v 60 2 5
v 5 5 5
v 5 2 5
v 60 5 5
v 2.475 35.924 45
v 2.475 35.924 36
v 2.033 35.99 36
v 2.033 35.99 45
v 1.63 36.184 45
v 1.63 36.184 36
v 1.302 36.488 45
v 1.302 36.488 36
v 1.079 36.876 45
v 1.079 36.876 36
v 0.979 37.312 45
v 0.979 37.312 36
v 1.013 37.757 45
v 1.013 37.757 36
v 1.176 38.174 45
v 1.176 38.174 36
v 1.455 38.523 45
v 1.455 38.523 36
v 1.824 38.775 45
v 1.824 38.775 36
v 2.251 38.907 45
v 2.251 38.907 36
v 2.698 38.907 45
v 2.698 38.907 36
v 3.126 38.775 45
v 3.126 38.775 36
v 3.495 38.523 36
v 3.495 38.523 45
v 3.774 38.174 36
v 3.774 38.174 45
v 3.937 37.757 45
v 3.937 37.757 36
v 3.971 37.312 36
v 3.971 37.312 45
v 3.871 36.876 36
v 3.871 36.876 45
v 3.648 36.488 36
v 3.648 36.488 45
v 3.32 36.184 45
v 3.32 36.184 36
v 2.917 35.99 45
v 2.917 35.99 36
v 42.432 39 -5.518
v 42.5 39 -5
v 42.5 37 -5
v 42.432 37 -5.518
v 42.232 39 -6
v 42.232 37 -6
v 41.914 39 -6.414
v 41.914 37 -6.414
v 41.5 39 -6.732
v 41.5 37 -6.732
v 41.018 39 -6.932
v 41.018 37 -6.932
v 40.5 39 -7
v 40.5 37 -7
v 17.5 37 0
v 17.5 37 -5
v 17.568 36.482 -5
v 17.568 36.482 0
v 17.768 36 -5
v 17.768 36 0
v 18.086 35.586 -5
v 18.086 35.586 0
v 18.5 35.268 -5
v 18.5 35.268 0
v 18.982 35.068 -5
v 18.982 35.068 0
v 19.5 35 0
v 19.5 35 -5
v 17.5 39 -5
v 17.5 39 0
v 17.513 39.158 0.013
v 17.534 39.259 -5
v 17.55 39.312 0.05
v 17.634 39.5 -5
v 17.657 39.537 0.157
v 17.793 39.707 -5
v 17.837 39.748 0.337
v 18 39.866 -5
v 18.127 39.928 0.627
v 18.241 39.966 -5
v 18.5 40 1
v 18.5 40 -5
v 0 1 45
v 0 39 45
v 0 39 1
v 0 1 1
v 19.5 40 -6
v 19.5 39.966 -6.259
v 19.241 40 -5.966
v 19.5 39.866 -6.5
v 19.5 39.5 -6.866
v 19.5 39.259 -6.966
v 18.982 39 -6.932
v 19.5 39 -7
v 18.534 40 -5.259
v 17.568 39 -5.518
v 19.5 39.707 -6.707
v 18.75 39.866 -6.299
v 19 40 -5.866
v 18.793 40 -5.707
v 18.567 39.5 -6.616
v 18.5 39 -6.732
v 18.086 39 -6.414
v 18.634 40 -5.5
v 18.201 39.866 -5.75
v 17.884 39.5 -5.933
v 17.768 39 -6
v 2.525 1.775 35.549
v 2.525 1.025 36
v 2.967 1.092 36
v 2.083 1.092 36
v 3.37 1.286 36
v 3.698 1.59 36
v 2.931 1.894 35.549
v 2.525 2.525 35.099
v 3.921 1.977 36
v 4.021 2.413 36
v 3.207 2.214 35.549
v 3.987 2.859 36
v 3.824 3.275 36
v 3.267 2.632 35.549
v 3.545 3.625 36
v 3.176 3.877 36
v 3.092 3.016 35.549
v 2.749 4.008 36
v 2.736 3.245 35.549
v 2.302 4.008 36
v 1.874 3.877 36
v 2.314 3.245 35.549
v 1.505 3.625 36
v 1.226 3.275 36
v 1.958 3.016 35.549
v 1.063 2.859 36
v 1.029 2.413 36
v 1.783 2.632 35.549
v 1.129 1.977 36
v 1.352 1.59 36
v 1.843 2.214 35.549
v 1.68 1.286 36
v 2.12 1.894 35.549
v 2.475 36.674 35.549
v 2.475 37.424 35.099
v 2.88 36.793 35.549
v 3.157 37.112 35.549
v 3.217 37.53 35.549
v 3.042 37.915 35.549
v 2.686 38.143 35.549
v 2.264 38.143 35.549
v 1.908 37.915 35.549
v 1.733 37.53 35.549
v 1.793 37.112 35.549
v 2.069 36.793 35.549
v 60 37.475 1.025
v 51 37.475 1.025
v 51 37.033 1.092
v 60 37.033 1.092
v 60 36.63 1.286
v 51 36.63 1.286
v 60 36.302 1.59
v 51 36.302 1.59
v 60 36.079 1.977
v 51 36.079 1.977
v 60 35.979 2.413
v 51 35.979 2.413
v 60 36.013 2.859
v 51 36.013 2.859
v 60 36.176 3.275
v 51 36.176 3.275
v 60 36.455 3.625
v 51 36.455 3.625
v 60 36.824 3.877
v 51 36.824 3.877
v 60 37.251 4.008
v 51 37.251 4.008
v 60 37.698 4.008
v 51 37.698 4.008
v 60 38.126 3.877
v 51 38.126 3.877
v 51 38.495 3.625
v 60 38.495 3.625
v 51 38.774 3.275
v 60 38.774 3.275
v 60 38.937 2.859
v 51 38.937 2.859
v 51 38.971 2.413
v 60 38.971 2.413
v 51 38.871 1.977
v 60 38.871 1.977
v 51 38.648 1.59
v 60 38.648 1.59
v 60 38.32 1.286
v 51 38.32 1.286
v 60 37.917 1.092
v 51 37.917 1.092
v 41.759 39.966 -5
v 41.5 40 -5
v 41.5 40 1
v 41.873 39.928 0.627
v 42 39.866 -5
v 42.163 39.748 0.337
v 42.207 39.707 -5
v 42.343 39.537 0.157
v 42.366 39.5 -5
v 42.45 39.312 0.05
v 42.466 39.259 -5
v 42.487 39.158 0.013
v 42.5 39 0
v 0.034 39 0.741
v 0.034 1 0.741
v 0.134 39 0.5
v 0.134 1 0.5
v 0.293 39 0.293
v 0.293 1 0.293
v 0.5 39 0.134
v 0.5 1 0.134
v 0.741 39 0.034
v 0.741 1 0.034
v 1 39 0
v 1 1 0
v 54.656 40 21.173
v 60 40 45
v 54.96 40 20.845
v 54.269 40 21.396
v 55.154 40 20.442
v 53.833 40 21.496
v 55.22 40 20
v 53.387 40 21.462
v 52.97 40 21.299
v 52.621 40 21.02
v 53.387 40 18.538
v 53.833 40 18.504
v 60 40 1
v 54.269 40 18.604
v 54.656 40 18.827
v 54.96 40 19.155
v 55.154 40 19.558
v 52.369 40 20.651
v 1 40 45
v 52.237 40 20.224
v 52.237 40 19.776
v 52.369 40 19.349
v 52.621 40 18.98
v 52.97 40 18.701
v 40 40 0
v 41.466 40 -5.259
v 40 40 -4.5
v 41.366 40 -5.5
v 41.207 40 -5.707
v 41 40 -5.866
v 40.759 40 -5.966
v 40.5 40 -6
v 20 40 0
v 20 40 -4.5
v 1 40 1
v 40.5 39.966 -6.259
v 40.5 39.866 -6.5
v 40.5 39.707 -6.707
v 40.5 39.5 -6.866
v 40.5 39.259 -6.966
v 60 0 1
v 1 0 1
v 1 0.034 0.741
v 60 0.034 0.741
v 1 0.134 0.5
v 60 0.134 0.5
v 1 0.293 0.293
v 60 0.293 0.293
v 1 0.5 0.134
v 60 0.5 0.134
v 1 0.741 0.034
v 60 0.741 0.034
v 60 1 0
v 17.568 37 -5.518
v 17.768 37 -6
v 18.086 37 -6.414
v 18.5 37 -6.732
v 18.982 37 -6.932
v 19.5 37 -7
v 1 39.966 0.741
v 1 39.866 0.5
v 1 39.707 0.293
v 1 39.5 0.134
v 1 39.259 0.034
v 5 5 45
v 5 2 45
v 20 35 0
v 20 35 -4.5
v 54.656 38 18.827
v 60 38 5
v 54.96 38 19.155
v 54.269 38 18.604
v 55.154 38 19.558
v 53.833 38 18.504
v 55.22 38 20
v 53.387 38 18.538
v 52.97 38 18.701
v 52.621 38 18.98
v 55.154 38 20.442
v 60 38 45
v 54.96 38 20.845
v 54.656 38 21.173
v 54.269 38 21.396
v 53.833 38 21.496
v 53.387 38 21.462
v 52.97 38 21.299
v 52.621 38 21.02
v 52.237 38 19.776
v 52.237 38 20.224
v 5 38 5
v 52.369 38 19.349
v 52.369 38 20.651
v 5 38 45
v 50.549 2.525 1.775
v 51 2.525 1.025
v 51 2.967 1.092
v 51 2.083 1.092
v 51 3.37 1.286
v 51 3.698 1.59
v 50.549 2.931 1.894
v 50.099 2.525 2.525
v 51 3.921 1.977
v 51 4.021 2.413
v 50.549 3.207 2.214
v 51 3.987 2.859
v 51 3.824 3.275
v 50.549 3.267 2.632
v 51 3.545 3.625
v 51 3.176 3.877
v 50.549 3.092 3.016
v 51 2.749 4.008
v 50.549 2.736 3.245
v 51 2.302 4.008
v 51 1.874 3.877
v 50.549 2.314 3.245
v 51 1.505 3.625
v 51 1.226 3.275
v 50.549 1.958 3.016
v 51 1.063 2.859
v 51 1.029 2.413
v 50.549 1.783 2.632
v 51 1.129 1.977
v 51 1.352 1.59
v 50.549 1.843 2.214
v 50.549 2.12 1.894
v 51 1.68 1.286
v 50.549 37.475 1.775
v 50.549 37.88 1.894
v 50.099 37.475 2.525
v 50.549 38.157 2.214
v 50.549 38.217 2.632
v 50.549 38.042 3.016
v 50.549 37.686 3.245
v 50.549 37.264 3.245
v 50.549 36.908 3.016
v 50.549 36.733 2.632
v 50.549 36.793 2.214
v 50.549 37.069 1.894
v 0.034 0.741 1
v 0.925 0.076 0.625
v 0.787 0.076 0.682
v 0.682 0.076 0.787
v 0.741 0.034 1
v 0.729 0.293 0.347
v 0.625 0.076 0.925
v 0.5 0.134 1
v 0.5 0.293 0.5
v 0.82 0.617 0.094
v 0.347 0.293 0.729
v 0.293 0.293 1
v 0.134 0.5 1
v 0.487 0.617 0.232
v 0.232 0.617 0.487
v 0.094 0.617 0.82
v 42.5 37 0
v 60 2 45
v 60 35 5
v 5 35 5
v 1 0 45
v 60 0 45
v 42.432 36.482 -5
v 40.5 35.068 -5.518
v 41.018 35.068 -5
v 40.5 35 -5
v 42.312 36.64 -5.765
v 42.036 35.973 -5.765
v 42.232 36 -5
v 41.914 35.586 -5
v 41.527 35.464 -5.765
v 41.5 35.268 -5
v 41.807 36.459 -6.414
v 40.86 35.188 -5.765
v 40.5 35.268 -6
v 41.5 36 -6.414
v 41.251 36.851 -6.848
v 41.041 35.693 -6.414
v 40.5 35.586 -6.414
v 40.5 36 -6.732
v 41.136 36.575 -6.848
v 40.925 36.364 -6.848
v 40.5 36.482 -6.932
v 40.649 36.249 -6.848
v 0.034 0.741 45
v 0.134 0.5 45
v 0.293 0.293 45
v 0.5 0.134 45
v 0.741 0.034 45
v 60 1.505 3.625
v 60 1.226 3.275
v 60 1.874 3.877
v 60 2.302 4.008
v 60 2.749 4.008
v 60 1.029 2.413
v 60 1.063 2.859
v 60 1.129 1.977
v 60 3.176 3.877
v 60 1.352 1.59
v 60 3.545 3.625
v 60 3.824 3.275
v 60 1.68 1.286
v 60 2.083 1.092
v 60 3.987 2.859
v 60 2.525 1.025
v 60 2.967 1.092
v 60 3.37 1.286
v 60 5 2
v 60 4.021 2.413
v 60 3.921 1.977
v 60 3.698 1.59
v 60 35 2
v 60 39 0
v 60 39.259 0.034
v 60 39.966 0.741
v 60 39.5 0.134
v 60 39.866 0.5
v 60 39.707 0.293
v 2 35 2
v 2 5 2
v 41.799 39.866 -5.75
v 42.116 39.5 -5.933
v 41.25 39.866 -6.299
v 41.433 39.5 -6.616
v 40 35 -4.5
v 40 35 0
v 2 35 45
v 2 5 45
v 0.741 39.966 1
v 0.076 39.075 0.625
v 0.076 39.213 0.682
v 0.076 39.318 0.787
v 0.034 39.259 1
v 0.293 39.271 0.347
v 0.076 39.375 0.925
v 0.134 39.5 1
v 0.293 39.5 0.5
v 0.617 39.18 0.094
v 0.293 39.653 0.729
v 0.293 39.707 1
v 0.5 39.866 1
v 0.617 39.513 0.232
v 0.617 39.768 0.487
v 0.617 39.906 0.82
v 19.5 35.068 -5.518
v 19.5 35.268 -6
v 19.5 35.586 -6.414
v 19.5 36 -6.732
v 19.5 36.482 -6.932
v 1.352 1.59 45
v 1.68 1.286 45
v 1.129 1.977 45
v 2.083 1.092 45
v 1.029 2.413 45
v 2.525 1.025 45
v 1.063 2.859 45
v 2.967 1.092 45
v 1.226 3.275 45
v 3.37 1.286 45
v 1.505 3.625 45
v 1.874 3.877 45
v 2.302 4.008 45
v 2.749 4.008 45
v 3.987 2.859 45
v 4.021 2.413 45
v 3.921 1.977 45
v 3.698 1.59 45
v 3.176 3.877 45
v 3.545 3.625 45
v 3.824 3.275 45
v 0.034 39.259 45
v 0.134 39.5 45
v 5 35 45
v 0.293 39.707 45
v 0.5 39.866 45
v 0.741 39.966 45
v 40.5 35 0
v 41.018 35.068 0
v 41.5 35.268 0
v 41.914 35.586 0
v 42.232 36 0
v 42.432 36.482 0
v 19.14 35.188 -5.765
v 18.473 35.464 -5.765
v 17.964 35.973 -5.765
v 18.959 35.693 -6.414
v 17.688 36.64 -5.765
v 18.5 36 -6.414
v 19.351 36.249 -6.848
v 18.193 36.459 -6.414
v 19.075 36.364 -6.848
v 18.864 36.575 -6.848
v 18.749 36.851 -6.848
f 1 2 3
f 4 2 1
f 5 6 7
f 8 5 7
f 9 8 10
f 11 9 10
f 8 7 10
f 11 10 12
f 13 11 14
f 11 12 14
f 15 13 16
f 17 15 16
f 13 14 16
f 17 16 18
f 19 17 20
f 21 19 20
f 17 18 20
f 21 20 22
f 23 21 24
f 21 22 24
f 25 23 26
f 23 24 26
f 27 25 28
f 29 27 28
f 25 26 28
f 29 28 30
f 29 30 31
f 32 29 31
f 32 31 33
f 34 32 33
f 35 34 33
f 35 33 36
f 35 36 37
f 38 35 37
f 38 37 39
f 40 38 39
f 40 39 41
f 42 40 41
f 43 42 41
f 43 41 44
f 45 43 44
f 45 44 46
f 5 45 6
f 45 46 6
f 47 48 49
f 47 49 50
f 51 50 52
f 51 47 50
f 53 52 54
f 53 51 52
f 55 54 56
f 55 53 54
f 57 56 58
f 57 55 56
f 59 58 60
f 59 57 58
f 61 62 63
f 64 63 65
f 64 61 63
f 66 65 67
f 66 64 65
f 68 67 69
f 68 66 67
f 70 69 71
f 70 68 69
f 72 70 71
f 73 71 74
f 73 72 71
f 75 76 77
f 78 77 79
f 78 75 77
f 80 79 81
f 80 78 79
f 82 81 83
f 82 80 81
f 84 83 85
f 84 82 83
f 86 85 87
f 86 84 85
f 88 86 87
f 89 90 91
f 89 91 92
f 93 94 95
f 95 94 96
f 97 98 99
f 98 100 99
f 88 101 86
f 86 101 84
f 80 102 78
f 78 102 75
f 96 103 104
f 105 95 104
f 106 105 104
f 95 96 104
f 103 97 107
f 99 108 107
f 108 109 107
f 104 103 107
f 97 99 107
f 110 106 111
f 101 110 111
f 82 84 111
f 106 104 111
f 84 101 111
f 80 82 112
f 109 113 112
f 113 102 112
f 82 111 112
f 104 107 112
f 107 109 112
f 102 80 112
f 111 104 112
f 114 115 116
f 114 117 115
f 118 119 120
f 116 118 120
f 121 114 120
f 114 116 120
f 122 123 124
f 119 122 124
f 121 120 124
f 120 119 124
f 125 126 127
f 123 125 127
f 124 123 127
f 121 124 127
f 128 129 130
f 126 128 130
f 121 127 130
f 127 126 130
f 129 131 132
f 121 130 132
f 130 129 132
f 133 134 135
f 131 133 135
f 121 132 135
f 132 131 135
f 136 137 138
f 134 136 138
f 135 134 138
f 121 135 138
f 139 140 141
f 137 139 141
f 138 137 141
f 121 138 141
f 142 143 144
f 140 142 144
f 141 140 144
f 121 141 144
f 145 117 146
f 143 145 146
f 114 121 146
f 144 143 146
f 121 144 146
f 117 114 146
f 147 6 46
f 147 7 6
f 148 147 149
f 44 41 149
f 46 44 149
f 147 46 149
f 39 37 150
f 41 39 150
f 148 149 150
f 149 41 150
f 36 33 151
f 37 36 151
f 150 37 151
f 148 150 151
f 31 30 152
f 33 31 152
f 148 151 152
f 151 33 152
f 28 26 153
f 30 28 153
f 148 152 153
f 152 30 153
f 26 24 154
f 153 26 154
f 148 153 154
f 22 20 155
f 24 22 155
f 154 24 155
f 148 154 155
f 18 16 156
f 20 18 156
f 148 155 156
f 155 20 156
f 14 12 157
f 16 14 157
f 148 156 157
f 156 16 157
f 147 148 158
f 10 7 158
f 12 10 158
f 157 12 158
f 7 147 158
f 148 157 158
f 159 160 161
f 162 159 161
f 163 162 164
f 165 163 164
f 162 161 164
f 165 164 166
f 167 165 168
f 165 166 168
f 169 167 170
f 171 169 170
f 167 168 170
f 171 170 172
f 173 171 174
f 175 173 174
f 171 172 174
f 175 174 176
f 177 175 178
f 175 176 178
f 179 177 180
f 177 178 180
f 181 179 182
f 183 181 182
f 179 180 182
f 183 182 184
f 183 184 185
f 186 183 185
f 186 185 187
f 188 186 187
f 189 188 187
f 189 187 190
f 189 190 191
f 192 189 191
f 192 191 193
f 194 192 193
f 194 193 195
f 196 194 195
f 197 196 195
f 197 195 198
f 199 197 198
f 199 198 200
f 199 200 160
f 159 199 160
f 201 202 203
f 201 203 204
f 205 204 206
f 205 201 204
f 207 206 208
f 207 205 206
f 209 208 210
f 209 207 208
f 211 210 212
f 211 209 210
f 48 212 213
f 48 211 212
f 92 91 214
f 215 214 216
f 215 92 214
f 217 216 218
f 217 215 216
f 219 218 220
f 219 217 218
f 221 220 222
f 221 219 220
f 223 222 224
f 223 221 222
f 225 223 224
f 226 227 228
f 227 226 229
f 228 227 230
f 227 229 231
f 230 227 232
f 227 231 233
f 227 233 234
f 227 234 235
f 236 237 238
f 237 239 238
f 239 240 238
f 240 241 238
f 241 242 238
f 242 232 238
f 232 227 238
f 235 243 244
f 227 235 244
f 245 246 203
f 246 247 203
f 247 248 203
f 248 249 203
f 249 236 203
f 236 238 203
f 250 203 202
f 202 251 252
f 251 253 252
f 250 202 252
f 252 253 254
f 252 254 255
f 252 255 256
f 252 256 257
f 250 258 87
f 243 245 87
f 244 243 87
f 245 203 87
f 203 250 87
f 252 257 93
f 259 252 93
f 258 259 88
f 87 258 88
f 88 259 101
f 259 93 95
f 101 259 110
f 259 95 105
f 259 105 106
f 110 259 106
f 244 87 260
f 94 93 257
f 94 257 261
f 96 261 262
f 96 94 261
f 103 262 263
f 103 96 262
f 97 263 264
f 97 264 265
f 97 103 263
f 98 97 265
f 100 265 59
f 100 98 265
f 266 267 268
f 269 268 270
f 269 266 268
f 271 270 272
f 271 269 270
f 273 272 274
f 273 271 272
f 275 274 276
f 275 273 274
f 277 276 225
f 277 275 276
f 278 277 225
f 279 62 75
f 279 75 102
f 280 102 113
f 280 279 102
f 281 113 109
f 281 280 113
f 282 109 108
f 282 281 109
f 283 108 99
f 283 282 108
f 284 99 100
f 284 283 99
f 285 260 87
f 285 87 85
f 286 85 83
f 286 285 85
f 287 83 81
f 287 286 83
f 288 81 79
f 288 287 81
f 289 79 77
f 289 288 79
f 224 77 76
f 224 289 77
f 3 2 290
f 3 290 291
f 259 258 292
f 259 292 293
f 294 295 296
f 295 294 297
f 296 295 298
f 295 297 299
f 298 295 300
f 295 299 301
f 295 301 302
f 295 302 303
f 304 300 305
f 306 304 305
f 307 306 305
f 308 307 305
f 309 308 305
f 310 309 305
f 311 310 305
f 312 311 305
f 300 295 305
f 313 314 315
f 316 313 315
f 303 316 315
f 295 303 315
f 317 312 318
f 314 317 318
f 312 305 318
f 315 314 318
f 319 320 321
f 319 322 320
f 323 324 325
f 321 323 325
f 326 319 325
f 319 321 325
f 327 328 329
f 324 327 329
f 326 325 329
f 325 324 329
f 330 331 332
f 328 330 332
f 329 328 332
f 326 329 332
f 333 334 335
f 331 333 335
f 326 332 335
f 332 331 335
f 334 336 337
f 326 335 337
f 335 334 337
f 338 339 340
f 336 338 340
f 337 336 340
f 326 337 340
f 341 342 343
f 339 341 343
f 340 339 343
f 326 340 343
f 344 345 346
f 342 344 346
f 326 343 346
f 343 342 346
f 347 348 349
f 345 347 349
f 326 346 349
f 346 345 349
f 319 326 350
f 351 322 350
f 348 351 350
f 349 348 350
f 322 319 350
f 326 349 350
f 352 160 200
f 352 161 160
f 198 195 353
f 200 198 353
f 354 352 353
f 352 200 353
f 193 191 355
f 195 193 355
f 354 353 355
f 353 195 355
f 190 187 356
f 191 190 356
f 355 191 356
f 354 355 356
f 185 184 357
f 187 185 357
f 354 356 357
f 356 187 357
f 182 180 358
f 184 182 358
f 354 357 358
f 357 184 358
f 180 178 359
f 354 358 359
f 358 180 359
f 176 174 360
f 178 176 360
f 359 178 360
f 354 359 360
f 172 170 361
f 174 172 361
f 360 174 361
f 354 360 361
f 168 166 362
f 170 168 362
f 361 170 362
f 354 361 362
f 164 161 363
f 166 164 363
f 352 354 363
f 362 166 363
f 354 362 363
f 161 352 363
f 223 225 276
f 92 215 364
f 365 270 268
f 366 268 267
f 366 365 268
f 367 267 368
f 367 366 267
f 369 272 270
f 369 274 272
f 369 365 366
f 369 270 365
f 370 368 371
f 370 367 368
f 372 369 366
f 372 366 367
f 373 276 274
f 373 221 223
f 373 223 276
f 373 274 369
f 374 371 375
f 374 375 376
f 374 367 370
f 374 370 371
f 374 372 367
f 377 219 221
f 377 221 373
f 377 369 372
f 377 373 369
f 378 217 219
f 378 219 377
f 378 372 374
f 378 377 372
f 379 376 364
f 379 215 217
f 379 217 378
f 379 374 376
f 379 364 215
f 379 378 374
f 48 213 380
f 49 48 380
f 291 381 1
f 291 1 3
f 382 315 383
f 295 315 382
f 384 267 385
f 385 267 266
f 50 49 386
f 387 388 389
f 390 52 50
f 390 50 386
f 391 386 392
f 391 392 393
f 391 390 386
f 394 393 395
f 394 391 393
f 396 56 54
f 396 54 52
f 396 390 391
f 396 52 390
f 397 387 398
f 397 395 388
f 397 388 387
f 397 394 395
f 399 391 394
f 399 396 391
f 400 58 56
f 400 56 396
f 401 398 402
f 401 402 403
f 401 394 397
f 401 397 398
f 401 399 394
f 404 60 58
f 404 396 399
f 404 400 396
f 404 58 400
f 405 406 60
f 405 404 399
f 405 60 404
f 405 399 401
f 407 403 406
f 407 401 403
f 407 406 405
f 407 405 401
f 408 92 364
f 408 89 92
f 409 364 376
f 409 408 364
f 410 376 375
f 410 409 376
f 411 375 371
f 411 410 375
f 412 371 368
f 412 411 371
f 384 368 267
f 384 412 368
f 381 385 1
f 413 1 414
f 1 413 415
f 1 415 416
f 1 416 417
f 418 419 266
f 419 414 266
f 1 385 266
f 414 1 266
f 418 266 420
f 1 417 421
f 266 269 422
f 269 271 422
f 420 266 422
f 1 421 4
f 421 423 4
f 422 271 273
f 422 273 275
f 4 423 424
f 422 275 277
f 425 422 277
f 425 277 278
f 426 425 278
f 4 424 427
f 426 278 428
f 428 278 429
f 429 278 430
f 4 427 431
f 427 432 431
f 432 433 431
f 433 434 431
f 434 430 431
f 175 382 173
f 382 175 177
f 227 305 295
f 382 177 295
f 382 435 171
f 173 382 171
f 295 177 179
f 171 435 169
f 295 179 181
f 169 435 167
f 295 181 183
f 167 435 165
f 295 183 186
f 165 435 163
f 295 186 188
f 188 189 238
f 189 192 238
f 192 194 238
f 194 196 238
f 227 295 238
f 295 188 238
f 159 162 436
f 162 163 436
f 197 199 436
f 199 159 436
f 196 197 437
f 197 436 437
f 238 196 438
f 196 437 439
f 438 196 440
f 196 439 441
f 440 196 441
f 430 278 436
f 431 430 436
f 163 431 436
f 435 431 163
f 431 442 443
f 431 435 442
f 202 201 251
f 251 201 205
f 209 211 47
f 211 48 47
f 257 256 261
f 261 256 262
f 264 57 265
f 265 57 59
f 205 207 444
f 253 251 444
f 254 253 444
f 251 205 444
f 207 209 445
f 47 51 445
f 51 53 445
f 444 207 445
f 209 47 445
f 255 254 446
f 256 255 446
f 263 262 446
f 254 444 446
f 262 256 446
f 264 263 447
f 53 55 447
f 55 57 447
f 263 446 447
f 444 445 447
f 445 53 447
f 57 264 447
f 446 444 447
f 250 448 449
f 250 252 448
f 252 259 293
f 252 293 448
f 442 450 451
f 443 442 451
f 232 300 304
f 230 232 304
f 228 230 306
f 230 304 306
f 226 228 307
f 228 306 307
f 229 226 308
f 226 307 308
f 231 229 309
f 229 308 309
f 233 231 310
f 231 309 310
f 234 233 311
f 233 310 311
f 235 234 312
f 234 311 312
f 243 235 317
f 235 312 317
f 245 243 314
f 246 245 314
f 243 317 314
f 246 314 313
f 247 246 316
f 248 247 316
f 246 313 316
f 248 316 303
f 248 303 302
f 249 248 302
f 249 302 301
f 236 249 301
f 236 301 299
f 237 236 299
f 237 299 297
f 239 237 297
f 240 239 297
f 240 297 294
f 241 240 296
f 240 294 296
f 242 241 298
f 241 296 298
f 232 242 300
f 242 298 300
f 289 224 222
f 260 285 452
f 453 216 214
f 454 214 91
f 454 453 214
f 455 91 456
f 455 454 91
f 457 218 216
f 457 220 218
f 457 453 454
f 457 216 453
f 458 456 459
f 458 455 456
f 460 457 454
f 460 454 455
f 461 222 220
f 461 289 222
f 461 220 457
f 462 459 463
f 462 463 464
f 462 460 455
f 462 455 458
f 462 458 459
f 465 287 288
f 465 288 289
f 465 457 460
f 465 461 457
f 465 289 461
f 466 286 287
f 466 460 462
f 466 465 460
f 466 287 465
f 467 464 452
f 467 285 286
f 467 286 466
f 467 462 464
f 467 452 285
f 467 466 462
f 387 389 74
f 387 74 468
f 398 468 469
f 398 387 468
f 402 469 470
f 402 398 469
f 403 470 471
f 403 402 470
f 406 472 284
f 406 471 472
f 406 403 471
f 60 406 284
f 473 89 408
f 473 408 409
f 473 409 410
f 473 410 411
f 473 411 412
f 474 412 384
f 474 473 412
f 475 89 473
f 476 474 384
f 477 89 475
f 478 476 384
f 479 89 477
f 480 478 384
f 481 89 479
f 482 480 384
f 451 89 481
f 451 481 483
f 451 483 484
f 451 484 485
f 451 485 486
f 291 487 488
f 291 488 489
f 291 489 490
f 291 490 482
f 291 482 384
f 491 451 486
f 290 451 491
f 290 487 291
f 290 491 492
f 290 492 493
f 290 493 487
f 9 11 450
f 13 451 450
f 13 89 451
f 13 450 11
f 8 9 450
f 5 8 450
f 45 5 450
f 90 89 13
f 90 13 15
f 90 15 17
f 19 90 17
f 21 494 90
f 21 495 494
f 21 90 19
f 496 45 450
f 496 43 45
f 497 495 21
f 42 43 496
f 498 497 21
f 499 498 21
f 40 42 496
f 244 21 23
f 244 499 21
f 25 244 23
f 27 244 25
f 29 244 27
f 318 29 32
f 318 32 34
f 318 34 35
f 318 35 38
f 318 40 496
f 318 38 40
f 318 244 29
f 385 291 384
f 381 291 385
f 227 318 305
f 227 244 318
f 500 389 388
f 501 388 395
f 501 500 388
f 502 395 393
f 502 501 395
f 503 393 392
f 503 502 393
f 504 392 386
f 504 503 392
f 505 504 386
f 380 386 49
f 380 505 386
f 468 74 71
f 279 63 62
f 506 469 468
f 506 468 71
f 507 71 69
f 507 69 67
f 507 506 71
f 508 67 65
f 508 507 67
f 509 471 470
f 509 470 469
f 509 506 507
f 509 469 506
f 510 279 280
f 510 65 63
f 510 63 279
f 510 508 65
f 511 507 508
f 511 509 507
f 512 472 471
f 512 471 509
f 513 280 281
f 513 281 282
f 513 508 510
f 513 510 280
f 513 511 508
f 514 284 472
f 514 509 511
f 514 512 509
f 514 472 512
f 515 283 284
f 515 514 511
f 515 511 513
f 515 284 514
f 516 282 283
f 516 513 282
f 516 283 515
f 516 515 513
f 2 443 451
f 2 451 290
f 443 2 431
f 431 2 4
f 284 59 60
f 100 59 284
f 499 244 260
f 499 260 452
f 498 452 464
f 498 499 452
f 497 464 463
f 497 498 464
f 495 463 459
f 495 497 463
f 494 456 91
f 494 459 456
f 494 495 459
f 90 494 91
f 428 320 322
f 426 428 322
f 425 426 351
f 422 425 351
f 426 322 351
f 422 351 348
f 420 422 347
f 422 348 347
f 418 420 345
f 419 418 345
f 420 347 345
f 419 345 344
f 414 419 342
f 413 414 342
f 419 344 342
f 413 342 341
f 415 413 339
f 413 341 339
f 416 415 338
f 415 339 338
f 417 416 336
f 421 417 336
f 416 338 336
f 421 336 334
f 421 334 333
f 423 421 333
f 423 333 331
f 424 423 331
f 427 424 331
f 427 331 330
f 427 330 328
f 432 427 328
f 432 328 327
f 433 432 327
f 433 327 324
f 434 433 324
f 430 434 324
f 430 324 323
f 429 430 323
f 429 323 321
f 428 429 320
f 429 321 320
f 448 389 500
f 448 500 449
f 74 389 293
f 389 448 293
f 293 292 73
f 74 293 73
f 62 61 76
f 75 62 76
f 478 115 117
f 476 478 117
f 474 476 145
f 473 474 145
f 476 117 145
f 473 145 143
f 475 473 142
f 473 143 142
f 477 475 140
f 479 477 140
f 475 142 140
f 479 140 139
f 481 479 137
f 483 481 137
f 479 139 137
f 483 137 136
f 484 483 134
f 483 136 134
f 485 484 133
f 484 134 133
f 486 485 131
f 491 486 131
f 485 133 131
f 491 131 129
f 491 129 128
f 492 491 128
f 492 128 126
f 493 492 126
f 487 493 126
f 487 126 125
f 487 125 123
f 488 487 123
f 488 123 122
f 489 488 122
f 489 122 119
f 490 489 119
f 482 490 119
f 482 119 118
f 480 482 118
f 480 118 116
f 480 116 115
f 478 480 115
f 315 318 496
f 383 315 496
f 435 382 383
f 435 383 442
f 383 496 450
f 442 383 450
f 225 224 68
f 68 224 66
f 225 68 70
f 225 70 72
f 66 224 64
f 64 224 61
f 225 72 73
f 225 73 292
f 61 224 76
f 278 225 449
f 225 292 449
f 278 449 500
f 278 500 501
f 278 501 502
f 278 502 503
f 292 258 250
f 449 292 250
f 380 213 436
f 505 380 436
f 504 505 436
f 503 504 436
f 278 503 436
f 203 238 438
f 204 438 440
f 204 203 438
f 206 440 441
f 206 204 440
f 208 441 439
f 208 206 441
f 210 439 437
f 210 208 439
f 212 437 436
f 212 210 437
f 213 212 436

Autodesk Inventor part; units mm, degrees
ref_plane "YZ Plane" through (0, 0, 0) normal (1, 0, 0) x (0, 1, 0)
ref_plane "XZ Plane" through (0, 0, 0) normal (0, 1, 0) x (-1, 0, 0)
ref_plane "XY Plane" through (0, 0, 0) normal (0, 0, 1) x (1, 0, 0)
sketch "Sketch2" plane through (0, 0, 0) normal (0, 0, 1) x (1, 0, 0)
  line L0 (0, 0) -> (60, 0)
  line L1 (60, 0) -> (60, 40)
  line L2 (60, 40) -> (0, 40)
  line L3 (0, 40) -> (0, 0)
  dimension "d11" = 60
  dimension "d12" = 40
extrude "Extrusion1" add sketch "Sketch2" along normal blind 45
shell "Shell1" thickness 5 removed faces 2 at (20, 26.6667, 45) at (60, 13.3333, 30)
sketch "Sketch4" plane through (0, 0, 45) normal (0, 0, 1) x (1, 0, 0)
  line L0 (5, 35) -> (5, 5) projected
  circle A0 centre (2.4749, 37.4236) radius 2
  circle A1 centre (2.4749, 2.5764) radius 2
  point P0 (0, 0)
  dimension "d20" = 4
  dimension "d21" = 4
hole "Hole2" at (2.4749, 37.4236, 45) direction (0, 0, -1) diameter 3 depth 9 tip angle 118
sketch "Sketch6" plane through (0, 0, 45) normal (0, 0, 1) x (1, 0, 0)
  line L0 (5, 35) -> (5, 5) projected
  circle A0 centre (2.5251, 2.5251) radius 2
  point P0 (0, 0)
  dimension "d37" = 4
hole "Hole3" at (2.5251, 2.5251, 45) direction (0, 0, -1) diameter 3 depth 9 tip angle 118
sketch "Sketch7" plane through (60, 0, 0) normal (1, 0, 0) x (0, 0, -1)
  line L0 (-5, 35) -> (-45, 35) projected
  circle A0 centre (-2.5251, 37.4749) radius 2
  point P0 (0, 0)
  dimension "d46" = 4
hole "Hole4" at (60, 37.4749, 2.5251) direction (-1, 0, 0) diameter 3 depth 9 tip angle 118
sketch "Sketch8" plane through (60, 0, 0) normal (1, 0, 0) x (0, 0, -1)
  line L0 (-5, 35) -> (-5, 5) projected
  circle A0 centre (-2.5251, 2.5251) radius 2
  point P0 (0, 0)
  dimension "d55" = 4
hole "Hole5" at (60, 2.5251, 2.5251) direction (-1, 0, 0) diameter 3 depth 9 tip angle 118
sketch "Sketch11" plane through (0, 0, 45) normal (0, 0, 1) x (1, 0, 0)
  line L0 (60, 35) -> (5, 35) projected
  line L1 (60, 38.9749) -> (60, 35.9749) projected
  line L2 (5, 35) -> (60, 35)
  line L3 (60, 35) -> (60, 38)
  line L4 (60, 38) -> (5, 38)
  line L5 (5, 38) -> (5, 35)
  point P0 (0, 0)
  dimension "d76" = 3
extrude "Extrusion4" cut sketch "Sketch11" against normal blind 40
sketch "Sketch12" plane through (0, 0, 45) normal (0, 0, 1) x (1, 0, 0)
  line L0 (5, 38) -> (5, 5) projected
  line L1 (60, 4.0251) -> (60, 1.0251) projected
  line L2 (5, 5) -> (60, 5)
  line L3 (60, 5) -> (60, 2)
  line L4 (60, 2) -> (5, 2)
  line L5 (5, 2) -> (5, 5)
  point P0 (0, 0)
  dimension "d79" = 3
extrude "Extrusion5" cut sketch "Sketch12" against normal blind 40
sketch "Sketch13" plane through (0, 0, 45) normal (0, 0, 1) x (1, 0, 0)
  line L0 (5, 38) -> (60, 38) projected
  line L1 (5, 38) -> (5, 35)
  line L2 (5, 2) -> (5, 38) projected
  line L3 (5, 35) -> (2, 35)
  line L4 (2, 35) -> (2, 5)
  line L5 (2, 5) -> (5, 5)
  line L6 (5, 5) -> (5, 35)
  point P0 (0, 0)
  dimension "d82" = 3
  dimension "d83" = 3
  dimension "d84" = 30
extrude "Extrusion6" cut sketch "Sketch13" against normal blind 40
sketch "Sketch14" plane through (60, 0, 0) normal (1, 0, 0) x (0, 0, -1)
  line L0 (-5, 38) -> (-5, 2) projected
  line L1 (-5, 38) -> (-5, 35)
  line L2 (-5, 35) -> (-2, 35)
  line L3 (-2, 35) -> (-2, 5)
  line L4 (-2, 5) -> (-5, 5)
  line L5 (-5, 5) -> (-5, 35)
  point P0 (0, 0)
  dimension "d87" = 3
  dimension "d88" = 3
  dimension "d89" = 30
extrude "Extrusion7" cut sketch "Sketch14" against normal blind 58
sketch "Sketch18" plane through (5, 38, 45) normal (0, -1, 0) x (1, 0, 0)
  line L0 (0, -40) -> (55, -40) projected
  line L1 (55, -40) -> (55, -25)
  line L2 (55, 0) -> (55, -40) projected
  line L3 (55, -25) -> (49, -25)
  circle A0 centre (48.7205, -25) radius 1.5
  point P0 (-5, -45)
  dimension "d108" = 15
  dimension "d109" = 6
  dimension "d110" = 3
extrude "Extrusion10" cut sketch "Sketch18" against normal blind 2
sketch "Sketch19" plane through (0, 0, 0) normal (0, 0, -1) x (-1, 0, 0)
  line L0 (0, 0) -> (0, 40)
  line L1 (0, 40) -> (-30, 40)
  line L2 (-2, 40) -> (-60, 40) projected
  line L3 (-30, 40) -> (-17.5, 40)
  line L4 (-17.5, 40) -> (-42.5, 40)
  line L5 (-42.5, 40) -> (-42.5, 35)
  line L6 (-42.5, 35) -> (-17.5, 35)
  line L7 (-17.5, 35) -> (-17.5, 40)
  dimension "d113" = 40
  dimension "d114" = 30
  dimension "d115" = 12.5
  dimension "d116" = 25
  dimension "d117" = 5
extrude "Extrusion11" add sketch "Sketch19" along normal blind 7
sketch "Sketch20" plane through (0, 40, 45) normal (0, 1, 0) x (1, 0, 0)
  line L0 (42.5, 45) -> (40, 45)
  line L1 (17.5, 45) -> (42.5, 45) projected
  line L2 (40, 45) -> (20, 45)
  line L3 (20, 45) -> (20, 49.5)
  line L4 (20, 49.5) -> (40, 49.5)
  line L5 (40, 49.5) -> (40, 45)
  point P0 (0, 45)
  dimension "d120" = 2.5
  dimension "d121" = 20
  dimension "d122" = 4.5
extrude "Extrusion12" cut sketch "Sketch20" against normal blind 5
fillet "Fillet3" radius 1 9 edges at (51.25, 40, 0) (42.5, 40, -3.5) (30, 40, -7) (17.5, 40, -3.5) (8.75, 40, 0) (0, 40, 22.5) (0, 20, 0) (30, 0, 0) (0, 0, 22.5)
fillet "Fillet4" radius 2 7 edges at (42.2071, 39.7071, -6.7071) (42.5, 37, -7) (30, 35, -7) (17.5, 37, -7) (17.7929, 39.7071, -6.7071) (42.5, 35, -3.5) (17.5, 35, -3.5)
sketch "Sketch21" plane through (1, 40, 45) normal (0, 1, 0) x (1, 0, 0)
  point P0 (-1, 45)
properties material "ABS Plastic"
